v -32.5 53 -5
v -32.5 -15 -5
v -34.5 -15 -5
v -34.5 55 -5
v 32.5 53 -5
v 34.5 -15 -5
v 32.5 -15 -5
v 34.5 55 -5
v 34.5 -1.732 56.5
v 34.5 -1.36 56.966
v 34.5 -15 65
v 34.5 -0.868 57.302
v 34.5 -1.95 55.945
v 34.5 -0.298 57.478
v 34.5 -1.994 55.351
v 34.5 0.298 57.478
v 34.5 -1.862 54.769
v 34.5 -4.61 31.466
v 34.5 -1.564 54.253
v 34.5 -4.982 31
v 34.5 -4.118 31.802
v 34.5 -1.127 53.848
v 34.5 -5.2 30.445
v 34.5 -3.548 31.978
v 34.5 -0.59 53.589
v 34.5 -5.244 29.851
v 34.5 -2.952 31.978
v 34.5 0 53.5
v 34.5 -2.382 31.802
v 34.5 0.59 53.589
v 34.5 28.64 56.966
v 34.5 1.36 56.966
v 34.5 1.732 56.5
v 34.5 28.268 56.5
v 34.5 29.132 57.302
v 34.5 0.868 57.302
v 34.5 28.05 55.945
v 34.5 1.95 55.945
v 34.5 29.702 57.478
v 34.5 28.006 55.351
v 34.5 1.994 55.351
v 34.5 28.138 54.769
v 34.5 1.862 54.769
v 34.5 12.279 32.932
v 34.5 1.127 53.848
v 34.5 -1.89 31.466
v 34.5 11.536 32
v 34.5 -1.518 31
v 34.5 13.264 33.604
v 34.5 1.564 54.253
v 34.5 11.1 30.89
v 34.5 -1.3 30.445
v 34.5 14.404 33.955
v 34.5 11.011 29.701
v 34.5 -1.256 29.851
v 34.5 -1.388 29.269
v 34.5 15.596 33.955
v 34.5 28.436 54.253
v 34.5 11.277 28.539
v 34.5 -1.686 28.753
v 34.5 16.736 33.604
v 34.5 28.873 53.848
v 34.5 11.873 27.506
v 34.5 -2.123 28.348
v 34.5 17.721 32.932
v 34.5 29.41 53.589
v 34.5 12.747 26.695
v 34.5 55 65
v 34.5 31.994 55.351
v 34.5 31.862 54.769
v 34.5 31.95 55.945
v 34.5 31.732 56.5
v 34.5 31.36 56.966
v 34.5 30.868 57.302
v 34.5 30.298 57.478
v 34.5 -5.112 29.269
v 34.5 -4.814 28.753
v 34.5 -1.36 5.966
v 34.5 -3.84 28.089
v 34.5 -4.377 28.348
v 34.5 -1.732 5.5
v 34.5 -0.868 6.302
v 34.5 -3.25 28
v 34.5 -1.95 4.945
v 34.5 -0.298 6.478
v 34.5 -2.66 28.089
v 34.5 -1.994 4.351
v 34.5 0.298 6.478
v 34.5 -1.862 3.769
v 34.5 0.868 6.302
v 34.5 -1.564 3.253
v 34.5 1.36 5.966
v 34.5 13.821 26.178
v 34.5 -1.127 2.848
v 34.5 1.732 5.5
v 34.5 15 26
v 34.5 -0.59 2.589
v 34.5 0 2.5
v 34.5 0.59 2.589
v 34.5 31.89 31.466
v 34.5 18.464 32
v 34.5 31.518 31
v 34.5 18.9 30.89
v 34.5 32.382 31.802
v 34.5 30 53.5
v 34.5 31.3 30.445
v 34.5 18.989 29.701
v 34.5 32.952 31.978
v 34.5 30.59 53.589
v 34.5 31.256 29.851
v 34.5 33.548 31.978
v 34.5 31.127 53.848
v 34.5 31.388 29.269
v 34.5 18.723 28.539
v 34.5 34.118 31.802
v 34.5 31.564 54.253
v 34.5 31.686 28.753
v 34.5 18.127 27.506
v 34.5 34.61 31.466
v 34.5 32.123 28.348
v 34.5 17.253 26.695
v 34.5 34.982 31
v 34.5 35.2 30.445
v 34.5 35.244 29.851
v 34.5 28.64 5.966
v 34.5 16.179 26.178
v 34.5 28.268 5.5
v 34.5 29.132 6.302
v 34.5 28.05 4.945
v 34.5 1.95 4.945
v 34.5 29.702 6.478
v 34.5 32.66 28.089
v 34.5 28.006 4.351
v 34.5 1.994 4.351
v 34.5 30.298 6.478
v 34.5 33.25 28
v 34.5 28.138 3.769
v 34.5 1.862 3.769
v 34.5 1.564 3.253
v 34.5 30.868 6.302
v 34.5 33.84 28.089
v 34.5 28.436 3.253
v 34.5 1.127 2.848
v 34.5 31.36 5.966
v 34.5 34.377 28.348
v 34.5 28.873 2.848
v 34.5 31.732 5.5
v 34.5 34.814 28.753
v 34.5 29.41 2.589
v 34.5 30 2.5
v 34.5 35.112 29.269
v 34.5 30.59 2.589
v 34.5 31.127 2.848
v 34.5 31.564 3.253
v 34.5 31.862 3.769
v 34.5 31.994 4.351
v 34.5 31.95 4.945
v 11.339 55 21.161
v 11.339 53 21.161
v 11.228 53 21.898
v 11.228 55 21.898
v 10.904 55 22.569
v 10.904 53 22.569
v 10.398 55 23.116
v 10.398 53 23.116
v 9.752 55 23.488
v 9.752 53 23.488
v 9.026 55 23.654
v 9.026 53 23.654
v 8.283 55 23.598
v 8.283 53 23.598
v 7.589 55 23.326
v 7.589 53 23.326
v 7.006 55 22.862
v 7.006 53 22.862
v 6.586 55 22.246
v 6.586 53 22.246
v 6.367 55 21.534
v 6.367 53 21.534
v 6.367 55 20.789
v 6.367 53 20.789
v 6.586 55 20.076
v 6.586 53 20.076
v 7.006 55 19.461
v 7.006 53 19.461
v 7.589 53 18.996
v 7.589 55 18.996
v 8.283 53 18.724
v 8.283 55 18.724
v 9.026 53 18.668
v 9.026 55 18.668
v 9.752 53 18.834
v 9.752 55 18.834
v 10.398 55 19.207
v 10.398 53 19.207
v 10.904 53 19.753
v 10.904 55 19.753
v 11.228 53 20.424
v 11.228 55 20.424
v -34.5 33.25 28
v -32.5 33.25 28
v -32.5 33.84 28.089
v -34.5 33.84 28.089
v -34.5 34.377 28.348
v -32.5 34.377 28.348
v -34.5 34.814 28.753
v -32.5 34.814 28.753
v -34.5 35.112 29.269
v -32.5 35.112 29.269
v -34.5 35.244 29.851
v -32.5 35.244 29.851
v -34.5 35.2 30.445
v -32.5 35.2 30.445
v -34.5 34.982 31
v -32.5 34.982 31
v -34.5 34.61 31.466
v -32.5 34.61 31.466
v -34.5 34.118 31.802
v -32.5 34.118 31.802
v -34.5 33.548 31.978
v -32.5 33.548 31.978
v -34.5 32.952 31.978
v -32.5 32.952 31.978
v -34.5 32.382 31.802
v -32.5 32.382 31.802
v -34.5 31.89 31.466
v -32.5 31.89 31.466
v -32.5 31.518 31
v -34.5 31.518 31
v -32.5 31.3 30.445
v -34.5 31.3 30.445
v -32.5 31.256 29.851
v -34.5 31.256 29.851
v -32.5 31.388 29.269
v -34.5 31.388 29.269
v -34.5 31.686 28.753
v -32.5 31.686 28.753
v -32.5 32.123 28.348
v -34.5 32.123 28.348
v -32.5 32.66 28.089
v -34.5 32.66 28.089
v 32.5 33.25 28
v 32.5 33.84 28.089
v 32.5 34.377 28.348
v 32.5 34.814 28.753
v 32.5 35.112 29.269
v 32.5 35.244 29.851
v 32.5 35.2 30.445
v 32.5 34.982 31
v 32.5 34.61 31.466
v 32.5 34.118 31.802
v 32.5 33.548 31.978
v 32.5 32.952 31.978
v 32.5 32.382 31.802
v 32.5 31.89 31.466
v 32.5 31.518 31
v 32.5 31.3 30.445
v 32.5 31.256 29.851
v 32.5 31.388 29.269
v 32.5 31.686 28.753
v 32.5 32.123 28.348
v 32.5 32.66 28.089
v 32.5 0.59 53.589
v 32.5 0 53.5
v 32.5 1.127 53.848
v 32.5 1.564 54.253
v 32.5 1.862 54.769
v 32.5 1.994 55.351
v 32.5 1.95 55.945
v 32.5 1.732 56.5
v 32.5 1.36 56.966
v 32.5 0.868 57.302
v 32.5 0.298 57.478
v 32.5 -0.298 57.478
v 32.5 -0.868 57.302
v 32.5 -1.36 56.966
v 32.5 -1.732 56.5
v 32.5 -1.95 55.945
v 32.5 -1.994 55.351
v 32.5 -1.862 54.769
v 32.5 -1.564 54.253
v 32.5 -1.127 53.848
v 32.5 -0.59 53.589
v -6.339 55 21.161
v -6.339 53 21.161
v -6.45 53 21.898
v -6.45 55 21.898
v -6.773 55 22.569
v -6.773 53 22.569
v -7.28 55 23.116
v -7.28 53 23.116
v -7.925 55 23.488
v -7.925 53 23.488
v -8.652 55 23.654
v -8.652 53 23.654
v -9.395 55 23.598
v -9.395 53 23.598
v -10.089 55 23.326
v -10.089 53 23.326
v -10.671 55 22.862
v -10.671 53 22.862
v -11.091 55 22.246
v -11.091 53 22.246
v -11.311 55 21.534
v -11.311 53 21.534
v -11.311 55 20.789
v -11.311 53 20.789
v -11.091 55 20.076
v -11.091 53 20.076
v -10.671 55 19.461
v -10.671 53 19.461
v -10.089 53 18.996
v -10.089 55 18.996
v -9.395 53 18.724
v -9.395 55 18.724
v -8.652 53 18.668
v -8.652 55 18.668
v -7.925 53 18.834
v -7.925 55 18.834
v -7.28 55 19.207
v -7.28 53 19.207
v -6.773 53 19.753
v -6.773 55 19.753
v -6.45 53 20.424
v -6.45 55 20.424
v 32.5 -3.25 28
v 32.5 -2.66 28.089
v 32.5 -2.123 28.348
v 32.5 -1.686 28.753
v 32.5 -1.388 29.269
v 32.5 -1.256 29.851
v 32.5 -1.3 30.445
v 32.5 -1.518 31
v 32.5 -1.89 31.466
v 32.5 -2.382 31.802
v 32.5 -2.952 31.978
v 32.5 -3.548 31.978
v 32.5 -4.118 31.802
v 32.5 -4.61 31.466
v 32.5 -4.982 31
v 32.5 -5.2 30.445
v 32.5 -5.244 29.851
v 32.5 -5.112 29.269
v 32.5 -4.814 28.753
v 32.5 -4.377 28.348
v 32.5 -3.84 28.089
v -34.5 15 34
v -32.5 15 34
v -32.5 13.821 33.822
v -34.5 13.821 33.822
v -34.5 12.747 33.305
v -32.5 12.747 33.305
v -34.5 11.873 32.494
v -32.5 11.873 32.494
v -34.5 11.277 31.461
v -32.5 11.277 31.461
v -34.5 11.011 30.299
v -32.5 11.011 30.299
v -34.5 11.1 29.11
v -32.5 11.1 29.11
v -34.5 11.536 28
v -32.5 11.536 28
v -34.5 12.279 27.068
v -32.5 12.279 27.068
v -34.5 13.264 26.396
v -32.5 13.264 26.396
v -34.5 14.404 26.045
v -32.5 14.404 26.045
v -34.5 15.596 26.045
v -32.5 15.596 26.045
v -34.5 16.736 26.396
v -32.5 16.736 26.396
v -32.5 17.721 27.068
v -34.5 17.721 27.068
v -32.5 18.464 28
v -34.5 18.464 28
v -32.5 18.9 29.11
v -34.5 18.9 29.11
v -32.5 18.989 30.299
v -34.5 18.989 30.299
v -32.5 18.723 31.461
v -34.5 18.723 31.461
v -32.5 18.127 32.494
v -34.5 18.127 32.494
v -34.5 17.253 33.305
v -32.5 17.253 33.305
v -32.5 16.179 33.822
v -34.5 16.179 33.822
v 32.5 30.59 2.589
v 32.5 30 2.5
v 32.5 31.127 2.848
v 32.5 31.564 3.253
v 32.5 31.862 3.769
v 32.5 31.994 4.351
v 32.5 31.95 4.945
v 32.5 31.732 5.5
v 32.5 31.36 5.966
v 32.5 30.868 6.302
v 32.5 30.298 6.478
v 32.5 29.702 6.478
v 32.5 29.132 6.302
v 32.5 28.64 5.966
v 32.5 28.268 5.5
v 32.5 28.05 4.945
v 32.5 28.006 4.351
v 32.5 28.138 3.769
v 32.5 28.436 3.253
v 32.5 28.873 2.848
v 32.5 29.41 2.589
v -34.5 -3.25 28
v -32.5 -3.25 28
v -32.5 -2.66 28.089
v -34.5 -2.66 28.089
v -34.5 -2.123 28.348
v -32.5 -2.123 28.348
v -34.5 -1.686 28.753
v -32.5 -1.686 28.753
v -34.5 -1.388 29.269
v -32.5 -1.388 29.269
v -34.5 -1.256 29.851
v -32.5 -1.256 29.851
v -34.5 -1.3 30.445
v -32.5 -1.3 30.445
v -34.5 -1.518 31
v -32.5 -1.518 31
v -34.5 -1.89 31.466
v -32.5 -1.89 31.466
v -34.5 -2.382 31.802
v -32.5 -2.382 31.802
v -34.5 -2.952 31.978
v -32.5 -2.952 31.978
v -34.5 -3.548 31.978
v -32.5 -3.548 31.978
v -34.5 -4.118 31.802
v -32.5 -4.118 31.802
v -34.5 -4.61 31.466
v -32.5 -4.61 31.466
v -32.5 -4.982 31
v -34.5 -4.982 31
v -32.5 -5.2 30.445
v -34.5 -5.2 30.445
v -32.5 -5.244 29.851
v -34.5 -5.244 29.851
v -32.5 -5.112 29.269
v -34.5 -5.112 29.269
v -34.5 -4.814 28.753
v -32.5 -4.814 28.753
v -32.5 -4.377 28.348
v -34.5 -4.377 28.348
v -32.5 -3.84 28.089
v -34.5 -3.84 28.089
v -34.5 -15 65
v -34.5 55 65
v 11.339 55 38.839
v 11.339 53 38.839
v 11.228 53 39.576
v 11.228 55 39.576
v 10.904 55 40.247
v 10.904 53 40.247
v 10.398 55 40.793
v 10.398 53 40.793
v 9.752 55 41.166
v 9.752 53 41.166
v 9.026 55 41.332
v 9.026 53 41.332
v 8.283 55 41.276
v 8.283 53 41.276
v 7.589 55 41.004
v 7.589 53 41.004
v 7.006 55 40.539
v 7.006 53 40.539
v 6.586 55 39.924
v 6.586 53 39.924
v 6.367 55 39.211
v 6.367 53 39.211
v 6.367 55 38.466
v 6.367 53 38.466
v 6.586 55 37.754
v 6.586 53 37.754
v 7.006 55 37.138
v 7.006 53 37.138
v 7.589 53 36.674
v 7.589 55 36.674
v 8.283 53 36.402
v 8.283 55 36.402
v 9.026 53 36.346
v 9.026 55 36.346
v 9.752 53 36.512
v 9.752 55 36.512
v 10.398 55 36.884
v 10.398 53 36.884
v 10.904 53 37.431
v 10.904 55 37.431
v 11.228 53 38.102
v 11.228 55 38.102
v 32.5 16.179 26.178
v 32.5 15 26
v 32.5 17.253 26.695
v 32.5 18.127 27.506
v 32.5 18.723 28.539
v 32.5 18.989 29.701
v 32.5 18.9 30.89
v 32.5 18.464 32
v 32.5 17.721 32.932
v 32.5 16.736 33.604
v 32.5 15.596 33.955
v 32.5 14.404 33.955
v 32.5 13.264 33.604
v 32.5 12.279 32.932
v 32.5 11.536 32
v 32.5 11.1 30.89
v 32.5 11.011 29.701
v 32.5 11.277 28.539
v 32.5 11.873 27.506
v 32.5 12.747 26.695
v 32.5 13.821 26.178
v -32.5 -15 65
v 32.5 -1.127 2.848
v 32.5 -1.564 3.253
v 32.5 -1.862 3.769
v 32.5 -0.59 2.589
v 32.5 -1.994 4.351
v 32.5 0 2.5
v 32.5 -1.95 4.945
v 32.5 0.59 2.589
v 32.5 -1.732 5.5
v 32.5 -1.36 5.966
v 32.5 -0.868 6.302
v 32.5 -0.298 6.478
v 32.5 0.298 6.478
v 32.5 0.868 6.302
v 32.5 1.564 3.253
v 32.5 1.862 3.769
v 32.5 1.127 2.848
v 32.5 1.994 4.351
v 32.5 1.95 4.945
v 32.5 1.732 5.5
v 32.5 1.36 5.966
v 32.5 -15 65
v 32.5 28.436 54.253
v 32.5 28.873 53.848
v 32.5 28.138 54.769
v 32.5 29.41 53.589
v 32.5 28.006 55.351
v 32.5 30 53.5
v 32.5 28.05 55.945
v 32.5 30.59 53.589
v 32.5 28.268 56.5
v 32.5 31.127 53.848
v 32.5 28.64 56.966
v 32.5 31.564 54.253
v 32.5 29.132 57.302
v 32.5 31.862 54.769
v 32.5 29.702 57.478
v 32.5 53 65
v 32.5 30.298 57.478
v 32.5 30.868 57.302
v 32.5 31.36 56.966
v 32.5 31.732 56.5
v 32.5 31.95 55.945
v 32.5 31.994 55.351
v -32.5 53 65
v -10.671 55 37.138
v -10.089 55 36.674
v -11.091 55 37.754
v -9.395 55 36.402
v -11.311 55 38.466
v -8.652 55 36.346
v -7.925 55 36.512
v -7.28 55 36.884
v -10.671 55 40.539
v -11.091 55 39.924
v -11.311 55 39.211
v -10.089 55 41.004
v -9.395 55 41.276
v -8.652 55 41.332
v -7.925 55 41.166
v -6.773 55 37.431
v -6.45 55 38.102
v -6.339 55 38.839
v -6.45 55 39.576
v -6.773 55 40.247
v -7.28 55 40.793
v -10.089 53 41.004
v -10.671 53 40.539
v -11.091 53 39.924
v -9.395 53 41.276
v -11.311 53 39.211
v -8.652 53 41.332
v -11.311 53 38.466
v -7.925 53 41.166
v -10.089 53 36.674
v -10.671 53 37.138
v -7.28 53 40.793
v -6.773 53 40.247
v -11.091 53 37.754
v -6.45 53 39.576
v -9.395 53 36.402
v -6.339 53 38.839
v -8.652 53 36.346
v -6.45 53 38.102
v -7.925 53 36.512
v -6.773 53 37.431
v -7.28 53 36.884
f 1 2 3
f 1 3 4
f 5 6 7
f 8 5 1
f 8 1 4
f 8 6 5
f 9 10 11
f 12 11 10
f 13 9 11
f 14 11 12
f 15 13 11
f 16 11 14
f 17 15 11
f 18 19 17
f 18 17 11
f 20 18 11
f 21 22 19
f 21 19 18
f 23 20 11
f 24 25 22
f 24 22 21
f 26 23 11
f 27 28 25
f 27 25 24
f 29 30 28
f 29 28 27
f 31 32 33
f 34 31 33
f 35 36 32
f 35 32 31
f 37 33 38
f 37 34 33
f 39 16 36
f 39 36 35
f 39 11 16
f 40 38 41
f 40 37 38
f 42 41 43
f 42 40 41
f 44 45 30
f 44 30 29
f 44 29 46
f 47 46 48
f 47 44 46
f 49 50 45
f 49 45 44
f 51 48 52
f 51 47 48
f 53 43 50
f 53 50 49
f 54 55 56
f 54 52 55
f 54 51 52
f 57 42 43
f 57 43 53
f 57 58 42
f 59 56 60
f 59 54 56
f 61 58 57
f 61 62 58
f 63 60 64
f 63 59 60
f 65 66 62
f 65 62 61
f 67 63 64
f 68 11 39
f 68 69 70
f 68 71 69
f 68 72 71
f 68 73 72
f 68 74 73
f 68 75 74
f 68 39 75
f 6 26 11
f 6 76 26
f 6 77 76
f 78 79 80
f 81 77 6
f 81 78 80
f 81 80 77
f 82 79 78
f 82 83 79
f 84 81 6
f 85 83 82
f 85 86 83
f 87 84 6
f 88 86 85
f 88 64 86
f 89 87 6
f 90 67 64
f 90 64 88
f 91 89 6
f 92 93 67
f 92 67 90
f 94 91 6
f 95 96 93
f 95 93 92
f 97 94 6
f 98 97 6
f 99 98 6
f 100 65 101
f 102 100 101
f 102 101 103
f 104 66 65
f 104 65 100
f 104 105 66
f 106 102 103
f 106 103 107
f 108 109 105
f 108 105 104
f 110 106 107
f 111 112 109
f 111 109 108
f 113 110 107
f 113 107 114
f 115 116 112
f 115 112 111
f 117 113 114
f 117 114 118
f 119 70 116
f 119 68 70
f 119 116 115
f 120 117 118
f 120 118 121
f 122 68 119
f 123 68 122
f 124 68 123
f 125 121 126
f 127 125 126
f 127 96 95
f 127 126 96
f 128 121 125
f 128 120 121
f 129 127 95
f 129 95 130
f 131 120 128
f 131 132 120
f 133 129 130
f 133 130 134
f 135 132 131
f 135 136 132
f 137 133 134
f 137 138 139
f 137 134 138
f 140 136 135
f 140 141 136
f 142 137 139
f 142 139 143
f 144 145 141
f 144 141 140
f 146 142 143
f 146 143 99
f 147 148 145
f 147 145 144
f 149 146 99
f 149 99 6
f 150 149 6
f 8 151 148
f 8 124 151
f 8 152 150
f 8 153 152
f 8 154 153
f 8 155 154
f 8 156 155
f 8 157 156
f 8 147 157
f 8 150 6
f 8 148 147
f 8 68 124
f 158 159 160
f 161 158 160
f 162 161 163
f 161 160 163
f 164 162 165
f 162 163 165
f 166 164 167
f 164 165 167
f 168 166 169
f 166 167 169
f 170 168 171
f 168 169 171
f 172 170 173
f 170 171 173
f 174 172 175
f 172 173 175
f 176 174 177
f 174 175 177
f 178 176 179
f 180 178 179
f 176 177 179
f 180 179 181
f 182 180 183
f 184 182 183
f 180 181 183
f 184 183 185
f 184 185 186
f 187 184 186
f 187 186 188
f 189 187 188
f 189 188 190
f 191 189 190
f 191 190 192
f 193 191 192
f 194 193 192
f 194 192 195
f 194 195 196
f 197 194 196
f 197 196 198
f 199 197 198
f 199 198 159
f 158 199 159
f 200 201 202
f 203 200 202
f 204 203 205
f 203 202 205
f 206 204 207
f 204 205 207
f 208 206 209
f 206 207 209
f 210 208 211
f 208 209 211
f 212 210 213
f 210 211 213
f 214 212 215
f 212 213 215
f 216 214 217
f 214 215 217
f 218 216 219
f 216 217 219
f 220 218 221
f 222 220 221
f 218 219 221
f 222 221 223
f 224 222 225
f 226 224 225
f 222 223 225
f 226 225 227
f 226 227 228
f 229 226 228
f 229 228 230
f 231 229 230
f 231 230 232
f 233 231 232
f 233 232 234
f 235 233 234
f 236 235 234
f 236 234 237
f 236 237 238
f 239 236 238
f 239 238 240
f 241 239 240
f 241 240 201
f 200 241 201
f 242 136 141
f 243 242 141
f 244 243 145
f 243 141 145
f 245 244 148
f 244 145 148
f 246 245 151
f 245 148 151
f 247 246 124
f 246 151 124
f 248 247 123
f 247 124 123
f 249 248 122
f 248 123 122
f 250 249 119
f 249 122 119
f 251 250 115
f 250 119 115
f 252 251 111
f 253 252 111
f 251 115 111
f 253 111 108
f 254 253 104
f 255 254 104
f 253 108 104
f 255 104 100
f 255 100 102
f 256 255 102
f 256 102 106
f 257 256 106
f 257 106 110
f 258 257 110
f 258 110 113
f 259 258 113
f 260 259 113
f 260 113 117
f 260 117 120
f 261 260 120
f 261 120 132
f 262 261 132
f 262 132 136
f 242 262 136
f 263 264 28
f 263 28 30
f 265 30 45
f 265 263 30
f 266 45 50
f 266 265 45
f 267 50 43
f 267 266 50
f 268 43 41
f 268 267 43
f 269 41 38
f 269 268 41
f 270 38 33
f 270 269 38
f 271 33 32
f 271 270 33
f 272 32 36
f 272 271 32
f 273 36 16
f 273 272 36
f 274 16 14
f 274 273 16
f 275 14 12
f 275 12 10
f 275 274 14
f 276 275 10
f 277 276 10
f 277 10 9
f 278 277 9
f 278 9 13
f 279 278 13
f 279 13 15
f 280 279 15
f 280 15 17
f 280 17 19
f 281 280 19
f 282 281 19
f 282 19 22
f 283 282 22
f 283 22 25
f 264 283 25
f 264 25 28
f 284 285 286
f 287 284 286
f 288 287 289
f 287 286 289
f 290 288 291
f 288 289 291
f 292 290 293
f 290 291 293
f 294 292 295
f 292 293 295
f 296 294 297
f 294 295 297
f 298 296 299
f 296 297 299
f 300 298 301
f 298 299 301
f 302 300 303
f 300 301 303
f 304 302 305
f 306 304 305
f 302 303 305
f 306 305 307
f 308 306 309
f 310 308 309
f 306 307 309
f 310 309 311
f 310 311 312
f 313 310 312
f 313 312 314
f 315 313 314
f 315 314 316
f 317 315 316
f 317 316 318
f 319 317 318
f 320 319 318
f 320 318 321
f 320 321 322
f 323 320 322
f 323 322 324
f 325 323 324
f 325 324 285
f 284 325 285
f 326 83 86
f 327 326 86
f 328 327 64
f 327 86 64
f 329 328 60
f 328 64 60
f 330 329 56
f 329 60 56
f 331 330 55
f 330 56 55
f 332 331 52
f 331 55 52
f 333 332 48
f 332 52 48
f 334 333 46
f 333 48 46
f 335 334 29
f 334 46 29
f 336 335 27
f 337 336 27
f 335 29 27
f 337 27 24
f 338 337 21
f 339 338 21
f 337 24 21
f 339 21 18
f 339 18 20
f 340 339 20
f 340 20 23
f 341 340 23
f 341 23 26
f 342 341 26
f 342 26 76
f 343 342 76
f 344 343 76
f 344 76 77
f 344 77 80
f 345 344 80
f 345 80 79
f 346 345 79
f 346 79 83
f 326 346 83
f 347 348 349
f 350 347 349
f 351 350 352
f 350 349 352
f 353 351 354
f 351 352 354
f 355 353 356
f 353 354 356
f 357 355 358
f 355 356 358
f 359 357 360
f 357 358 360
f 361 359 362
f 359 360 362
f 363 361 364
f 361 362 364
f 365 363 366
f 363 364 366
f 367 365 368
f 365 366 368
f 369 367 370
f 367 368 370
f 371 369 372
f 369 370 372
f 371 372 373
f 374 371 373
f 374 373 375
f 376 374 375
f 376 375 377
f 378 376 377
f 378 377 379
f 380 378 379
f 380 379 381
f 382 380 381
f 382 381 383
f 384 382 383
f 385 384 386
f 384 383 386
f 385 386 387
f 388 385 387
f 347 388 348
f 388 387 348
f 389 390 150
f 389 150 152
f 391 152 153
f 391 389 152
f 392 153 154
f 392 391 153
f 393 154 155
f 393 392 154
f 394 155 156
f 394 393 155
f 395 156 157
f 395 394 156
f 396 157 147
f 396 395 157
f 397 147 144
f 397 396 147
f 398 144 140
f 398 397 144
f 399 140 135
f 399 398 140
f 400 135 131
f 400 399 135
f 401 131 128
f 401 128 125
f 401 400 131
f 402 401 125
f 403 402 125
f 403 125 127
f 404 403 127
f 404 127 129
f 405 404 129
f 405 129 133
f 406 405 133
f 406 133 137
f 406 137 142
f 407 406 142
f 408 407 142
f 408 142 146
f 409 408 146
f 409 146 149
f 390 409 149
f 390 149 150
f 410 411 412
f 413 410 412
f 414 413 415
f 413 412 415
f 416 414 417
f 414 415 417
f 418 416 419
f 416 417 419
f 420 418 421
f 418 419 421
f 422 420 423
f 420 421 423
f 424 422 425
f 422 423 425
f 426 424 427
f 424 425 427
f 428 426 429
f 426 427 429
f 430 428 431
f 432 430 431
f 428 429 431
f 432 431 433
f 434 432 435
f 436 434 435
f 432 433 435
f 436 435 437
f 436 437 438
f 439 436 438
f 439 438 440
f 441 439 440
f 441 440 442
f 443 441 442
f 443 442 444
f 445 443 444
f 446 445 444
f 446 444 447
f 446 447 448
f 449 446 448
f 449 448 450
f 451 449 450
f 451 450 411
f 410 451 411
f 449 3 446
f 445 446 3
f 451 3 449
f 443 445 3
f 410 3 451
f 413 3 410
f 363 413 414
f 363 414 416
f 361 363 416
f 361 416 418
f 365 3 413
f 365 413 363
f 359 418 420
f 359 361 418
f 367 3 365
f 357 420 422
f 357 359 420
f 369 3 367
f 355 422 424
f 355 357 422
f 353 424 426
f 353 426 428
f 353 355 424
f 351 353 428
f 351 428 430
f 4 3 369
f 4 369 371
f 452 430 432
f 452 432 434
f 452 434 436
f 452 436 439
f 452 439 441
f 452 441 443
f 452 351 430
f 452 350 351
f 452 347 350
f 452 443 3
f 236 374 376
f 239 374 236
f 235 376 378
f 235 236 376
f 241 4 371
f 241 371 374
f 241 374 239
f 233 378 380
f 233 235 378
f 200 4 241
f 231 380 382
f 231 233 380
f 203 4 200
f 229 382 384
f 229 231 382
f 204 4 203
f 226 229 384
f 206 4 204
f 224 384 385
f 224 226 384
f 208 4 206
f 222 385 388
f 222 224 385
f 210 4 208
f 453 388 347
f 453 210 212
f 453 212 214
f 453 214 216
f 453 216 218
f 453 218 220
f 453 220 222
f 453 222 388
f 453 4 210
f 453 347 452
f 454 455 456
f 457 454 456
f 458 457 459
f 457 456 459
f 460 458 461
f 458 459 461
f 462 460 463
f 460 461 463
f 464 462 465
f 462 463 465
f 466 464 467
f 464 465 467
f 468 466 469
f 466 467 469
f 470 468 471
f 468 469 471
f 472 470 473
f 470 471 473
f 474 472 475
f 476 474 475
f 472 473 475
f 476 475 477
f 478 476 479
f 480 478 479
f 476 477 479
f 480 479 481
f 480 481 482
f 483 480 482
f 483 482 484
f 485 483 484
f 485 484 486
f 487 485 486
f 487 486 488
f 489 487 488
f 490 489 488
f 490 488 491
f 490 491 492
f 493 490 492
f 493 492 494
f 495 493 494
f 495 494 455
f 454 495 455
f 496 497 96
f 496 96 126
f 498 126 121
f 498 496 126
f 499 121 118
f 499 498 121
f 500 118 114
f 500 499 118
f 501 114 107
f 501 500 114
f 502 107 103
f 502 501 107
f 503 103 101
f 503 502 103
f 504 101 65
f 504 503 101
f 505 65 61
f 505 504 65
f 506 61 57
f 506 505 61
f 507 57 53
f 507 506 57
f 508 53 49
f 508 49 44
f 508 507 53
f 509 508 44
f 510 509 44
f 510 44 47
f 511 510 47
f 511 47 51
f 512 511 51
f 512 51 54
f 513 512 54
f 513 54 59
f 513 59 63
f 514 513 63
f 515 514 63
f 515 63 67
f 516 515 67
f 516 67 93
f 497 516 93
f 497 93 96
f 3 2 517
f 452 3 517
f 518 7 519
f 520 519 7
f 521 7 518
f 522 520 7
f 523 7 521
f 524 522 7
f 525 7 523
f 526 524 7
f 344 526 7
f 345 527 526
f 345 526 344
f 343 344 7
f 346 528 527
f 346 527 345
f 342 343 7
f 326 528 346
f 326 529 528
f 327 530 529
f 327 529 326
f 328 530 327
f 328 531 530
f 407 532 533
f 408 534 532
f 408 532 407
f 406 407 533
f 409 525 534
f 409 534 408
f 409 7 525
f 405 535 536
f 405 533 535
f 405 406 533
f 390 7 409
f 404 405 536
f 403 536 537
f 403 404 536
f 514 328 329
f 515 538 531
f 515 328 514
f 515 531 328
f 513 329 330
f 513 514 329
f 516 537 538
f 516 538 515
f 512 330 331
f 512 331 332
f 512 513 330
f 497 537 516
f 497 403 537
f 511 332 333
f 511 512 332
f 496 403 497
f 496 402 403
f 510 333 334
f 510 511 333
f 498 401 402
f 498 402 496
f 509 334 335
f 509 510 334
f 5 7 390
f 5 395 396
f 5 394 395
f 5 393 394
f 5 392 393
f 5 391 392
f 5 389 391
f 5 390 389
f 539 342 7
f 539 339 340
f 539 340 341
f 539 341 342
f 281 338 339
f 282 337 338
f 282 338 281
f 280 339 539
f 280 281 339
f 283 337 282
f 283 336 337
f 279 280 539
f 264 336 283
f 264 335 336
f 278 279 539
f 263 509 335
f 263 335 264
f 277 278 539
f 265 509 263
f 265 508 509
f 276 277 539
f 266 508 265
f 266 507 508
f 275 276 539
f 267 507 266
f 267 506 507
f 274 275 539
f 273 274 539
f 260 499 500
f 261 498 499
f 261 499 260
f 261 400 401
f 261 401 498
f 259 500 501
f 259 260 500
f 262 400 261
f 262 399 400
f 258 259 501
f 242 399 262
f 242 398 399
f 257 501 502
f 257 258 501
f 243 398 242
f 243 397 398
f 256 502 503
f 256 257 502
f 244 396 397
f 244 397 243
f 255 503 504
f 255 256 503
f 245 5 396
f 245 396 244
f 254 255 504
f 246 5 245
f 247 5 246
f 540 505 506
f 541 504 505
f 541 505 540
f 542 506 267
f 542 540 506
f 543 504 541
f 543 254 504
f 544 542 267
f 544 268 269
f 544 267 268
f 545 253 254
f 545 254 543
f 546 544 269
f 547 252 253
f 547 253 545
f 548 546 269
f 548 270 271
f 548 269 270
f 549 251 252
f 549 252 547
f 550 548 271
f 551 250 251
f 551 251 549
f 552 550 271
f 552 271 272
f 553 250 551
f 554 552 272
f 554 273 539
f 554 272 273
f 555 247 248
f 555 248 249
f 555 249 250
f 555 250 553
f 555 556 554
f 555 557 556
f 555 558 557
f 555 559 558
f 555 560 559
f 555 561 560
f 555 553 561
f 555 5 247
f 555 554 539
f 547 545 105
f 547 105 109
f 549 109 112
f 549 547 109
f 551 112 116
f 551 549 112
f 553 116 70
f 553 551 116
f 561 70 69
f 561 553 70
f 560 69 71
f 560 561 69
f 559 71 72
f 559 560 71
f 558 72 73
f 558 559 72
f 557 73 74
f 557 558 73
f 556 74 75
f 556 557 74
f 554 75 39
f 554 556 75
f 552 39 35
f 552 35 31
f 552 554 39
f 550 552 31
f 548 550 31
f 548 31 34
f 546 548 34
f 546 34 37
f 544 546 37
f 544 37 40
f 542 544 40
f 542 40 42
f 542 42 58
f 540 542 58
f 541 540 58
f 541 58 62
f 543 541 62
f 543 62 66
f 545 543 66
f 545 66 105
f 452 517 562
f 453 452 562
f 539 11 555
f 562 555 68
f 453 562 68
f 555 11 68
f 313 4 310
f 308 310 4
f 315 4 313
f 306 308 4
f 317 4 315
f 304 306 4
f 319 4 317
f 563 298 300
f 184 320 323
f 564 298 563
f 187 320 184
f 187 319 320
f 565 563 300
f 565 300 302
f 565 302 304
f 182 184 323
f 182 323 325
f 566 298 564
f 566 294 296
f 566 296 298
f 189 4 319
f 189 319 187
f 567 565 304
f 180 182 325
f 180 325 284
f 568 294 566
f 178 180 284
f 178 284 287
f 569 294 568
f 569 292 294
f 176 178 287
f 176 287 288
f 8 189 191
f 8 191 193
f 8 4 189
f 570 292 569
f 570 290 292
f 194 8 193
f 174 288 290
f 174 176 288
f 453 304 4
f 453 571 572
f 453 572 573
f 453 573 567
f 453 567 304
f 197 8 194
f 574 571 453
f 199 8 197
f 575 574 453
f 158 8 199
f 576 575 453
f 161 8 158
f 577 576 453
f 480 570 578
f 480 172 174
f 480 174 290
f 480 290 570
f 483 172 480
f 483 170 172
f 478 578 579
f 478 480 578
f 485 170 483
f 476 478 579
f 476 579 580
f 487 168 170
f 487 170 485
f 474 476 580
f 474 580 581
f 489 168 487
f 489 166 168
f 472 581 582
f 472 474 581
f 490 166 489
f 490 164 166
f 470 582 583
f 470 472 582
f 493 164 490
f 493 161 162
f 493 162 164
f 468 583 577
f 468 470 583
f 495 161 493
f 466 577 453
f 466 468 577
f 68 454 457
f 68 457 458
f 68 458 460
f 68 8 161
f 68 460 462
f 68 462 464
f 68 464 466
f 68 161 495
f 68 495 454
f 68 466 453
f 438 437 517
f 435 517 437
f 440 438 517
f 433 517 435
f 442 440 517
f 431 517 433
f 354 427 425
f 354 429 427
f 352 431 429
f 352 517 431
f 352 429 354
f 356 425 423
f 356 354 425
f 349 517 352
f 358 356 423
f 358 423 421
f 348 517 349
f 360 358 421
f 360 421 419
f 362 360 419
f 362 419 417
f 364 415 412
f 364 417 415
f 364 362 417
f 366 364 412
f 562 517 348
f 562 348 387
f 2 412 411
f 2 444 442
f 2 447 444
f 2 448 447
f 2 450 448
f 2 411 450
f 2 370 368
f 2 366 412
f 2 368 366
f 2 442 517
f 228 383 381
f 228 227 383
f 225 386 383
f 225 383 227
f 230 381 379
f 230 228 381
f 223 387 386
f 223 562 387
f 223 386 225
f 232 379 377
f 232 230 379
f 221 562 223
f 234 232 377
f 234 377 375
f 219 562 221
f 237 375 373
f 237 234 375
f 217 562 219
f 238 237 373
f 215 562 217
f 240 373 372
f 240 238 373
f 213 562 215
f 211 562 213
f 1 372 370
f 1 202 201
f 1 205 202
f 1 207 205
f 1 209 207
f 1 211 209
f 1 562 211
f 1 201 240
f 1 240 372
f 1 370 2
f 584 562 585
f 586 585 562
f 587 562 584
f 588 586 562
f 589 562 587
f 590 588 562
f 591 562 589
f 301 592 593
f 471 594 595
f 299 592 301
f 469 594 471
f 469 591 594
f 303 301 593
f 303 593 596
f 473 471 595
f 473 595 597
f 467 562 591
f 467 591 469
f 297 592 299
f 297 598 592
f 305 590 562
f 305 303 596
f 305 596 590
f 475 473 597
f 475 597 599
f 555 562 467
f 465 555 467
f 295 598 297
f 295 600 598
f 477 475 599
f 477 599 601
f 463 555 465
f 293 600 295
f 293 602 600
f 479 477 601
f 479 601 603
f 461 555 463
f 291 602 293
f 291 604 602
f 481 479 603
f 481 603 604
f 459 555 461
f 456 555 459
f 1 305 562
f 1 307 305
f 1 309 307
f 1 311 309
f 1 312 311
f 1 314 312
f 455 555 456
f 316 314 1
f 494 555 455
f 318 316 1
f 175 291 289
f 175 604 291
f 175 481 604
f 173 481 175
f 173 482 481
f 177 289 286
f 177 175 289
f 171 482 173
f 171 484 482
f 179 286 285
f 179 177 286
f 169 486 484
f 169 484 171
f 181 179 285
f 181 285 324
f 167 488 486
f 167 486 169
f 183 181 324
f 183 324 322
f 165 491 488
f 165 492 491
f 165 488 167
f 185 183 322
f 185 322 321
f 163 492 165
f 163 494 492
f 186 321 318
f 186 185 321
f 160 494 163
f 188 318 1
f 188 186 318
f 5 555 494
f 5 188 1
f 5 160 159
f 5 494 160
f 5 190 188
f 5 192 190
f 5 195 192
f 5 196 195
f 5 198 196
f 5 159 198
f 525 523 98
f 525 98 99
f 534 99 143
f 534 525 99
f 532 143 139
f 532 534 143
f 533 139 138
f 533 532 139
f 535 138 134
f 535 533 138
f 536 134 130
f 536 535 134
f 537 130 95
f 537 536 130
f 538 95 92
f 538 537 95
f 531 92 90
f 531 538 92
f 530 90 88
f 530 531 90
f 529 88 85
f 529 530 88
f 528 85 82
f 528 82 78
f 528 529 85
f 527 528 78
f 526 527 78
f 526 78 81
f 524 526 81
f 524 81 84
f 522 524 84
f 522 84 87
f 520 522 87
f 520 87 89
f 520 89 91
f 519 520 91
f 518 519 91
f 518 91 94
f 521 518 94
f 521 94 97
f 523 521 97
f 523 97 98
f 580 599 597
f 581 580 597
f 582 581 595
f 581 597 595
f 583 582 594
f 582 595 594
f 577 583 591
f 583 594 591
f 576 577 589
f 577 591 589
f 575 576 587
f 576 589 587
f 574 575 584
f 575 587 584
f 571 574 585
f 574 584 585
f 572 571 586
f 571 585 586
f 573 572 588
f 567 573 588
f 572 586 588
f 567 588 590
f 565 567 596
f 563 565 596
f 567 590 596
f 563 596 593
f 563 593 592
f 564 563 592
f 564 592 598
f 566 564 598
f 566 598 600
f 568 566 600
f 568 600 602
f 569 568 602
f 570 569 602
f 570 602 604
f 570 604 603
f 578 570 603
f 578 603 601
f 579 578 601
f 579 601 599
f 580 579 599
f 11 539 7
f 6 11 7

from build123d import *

# Parameters (mm, degrees)
RESSALTO_EXTRUS_O1_DEPTH = 60
ESBO_O2_R                = 4
CORTE_EXTRUS_O1_DEPTH    = 65
ESBO_O3_R                = 2.5
CORTE_EXTRUS_O2_DEPTH    = 10
RESSALTO_EXTRUS_O2_DEPTH = 5
RESSALTO_EXTRUS_O3_DEPTH = 5
ESBO_O6_R                = 2
CORTE_EXTRUS_O3_DEPTH    = 10
ESBO_O7_W                = 70
ESBO_O7_H                = 70
ESBO_O7_R                = 2
ESBO_O7_R_2              = 4
RESSALTO_EXTRUS_O4_DEPTH = 2.5
ESBO_O8_W                = 70
ESBO_O8_H                = 70
ESBO_O8_R                = 4
RESSALTO_EXTRUS_O5_DEPTH = 2.5
ESBO_O9_W                = 70
ESBO_O9_H                = 68
CORTE_EXTRUS_O4_DEPTH    = 2.5
ESBO_O10_W               = 70
ESBO_O10_H               = 68
CORTE_EXTRUS_O5_DEPTH    = 2.5
ESBO_O11_R               = 2
CORTE_EXTRUS_O6_DEPTH    = 70


with BuildPart() as part:
    # Esboço1 → Ressalto-extrusão1 (new body)
    with BuildSketch(Plane.XY):
        Polygon((32, -15), (32, 55), (-32, 55), (-32, -15), (-30, -15), (-30, -13), (-30, 53), (30, 53), (30, -13), (30, -15), align=None)
    extrude(amount=RESSALTO_EXTRUS_O1_DEPTH)

    # Esboço2 → Corte-extrusão1 (cut, through all)
    with BuildSketch(Plane(origin=(32, 0, 0), x_dir=(0, 0, -1), z_dir=(1, 0, 0))):
        with Locations((-30, 15)):
            Circle(ESBO_O2_R)
    extrude(amount=-CORTE_EXTRUS_O1_DEPTH, mode=Mode.SUBTRACT)

    # Esboço3 → Corte-extrusão2 (cut)
    with BuildSketch(Plane.XZ.offset(-53)):
        with Locations((-8.838834765, 38.838834765)):
            Circle(ESBO_O3_R)
        with Locations((-8.838834765, 21.161165235)):
            Circle(ESBO_O3_R)
        with Locations((8.838834765, 21.161165235)):
            Circle(ESBO_O3_R)
        with Locations((8.838834765, 38.838834765)):
            Circle(ESBO_O3_R)
    extrude(amount=-CORTE_EXTRUS_O2_DEPTH, mode=Mode.SUBTRACT)

    # Esboço4 → Ressalto-extrusão2 (add)
    with BuildSketch(Plane.XY.offset(60)):
        Polygon((-32, 55), (-32, -15), (-30, -15), (-30, 53), (30, 53), (30, -15), (32, -15), (32, 55), align=None)
    extrude(amount=RESSALTO_EXTRUS_O2_DEPTH)

    # Esboço5 → Ressalto-extrusão3 (add)
    with BuildSketch(Plane(origin=(0, 0, 0), x_dir=(-1, 0, 0), z_dir=(0, 0, -1))):
        Polygon((32, -15), (32, 55), (-32, 55), (-32, -15), (-30, -15), (-30, 53), (30, 53), (30, -15), align=None)
    extrude(amount=RESSALTO_EXTRUS_O3_DEPTH)

    # Esboço6 → Corte-extrusão3 (cut)
    with BuildSketch(Plane(origin=(32, 0, 0), x_dir=(0, 0, -1), z_dir=(1, 0, 0))):
        with Locations((-4.5, 0)):
            Circle(ESBO_O6_R)
        with Locations((-4.5, 30)):
            Circle(ESBO_O6_R)
        with Locations((-55.5, 0)):
            Circle(ESBO_O6_R)
        with Locations((-55.5, 30)):
            Circle(ESBO_O6_R)
    extrude(amount=-CORTE_EXTRUS_O3_DEPTH, mode=Mode.SUBTRACT)

    # Esboço7 → Ressalto-extrusão4 (add)
    with BuildSketch(Plane(origin=(32, 0, 0), x_dir=(0, 0, -1), z_dir=(1, 0, 0))):
        with Locations((-30, 20)):
            Rectangle(ESBO_O7_W, ESBO_O7_H)
        with Locations((-55.5, 0)):
            Circle(ESBO_O7_R, mode=Mode.SUBTRACT)
        with Locations((-55.5, 30)):
            Circle(ESBO_O7_R, mode=Mode.SUBTRACT)
        with Locations((-30, 15)):
            Circle(ESBO_O7_R_2, mode=Mode.SUBTRACT)
        with Locations((-4.5, 0)):
            Circle(ESBO_O7_R, mode=Mode.SUBTRACT)
        with Locations((-4.5, 30)):
            Circle(ESBO_O7_R, mode=Mode.SUBTRACT)
    extrude(amount=RESSALTO_EXTRUS_O4_DEPTH)

    # Esboço8 → Ressalto-extrusão5 (add)
    with BuildSketch(Plane.ZY.offset(32)):
        with Locations((30, 20)):
            Rectangle(ESBO_O8_W, ESBO_O8_H)
        with Locations((30, 15)):
            Circle(ESBO_O8_R, mode=Mode.SUBTRACT)
    extrude(amount=RESSALTO_EXTRUS_O5_DEPTH)

    # Esboço9 → Corte-extrusão4 (cut)
    with BuildSketch(Plane.ZY.offset(-30)):
        with Locations((30, 19)):
            Rectangle(ESBO_O9_W, ESBO_O9_H)
    extrude(amount=-CORTE_EXTRUS_O4_DEPTH, mode=Mode.SUBTRACT)

    # Esboço10 → Corte-extrusão5 (cut)
    with BuildSketch(Plane(origin=(-30, 0, 0), x_dir=(0, 0, -1), z_dir=(1, 0, 0))):
        with Locations((-30, 19)):
            Rectangle(ESBO_O10_W, ESBO_O10_H)
    extrude(amount=-CORTE_EXTRUS_O5_DEPTH, mode=Mode.SUBTRACT)

    # Esboço11 → Corte-extrusão6 (cut, through all)
    with BuildSketch(Plane(origin=(34.5, 0, 0), x_dir=(0, 0, -1), z_dir=(1, 0, 0))):
        with Locations((-30, -3.25)):
            Circle(ESBO_O11_R)
        with Locations((-30, 33.25)):
            Circle(ESBO_O11_R)
    extrude(amount=-CORTE_EXTRUS_O6_DEPTH, mode=Mode.SUBTRACT)


solid = part.part
